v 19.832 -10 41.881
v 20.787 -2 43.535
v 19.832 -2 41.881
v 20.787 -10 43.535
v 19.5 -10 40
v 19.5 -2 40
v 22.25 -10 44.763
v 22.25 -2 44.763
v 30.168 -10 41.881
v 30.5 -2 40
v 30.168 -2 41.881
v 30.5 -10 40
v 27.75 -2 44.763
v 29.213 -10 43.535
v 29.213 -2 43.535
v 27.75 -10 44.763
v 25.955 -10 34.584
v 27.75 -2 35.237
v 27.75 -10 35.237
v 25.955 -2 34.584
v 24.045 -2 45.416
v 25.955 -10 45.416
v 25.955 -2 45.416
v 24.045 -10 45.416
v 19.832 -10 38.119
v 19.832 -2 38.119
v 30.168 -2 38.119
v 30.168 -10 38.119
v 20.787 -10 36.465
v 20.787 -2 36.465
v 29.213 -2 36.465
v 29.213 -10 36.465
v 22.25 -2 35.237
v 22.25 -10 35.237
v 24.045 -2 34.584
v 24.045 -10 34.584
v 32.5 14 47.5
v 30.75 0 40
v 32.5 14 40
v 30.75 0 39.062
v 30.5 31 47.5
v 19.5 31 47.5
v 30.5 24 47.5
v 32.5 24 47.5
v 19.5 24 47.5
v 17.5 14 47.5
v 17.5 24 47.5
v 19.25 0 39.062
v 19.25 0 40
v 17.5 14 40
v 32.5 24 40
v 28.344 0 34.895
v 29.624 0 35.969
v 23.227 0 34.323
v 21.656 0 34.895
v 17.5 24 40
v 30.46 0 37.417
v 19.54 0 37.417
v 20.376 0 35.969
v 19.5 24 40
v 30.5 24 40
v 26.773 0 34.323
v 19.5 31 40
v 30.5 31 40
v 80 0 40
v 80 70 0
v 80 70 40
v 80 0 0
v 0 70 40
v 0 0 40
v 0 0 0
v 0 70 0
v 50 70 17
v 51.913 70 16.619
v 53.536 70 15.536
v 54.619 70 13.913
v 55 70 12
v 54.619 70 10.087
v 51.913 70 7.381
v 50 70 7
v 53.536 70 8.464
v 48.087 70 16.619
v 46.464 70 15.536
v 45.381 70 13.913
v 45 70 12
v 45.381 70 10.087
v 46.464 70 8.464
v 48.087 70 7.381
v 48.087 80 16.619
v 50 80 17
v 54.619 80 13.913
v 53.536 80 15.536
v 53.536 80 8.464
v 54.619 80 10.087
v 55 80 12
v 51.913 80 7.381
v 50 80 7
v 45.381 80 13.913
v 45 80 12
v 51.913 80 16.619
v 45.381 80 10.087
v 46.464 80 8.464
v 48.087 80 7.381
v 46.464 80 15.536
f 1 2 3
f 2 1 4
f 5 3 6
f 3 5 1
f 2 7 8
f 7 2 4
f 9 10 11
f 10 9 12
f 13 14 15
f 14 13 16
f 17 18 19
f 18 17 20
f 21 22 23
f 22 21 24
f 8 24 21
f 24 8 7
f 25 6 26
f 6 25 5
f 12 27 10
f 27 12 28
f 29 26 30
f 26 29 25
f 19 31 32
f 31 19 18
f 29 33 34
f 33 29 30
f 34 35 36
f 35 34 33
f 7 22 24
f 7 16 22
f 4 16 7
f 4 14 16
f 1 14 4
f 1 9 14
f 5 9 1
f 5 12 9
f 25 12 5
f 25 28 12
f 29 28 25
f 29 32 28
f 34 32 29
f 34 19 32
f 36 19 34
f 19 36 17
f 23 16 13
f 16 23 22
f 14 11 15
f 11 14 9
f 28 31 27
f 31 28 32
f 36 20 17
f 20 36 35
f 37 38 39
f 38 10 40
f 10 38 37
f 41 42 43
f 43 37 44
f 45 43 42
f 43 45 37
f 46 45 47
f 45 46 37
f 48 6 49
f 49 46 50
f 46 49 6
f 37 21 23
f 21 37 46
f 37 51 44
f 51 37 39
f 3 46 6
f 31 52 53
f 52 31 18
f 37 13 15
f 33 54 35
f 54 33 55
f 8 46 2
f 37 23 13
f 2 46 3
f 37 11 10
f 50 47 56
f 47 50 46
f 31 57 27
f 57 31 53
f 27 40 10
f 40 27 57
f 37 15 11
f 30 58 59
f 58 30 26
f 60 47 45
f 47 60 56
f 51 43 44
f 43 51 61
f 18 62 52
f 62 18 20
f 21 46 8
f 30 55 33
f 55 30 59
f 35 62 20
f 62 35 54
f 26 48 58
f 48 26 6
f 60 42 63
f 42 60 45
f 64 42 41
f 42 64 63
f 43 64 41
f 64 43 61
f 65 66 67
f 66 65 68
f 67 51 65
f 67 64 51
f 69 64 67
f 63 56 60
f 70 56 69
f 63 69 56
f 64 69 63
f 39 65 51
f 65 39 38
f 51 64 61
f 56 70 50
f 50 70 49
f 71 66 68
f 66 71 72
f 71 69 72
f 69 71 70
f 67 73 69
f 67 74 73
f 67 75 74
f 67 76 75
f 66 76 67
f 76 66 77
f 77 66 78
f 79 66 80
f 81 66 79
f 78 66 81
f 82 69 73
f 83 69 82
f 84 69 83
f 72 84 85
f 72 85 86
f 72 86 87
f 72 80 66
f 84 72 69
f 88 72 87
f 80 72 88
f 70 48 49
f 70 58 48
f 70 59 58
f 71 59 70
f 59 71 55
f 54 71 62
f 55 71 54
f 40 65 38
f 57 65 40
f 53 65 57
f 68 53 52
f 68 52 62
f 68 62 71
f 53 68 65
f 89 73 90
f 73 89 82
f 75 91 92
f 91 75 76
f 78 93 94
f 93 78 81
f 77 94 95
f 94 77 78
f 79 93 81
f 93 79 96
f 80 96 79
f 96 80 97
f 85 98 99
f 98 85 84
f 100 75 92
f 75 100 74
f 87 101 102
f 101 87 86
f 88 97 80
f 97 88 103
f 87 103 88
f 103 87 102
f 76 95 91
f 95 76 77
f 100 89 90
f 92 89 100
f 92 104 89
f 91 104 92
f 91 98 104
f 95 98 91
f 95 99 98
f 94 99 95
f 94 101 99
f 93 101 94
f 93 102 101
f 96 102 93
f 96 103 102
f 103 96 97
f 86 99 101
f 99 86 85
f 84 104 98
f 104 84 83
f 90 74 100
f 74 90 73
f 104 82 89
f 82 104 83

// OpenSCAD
module inner() {
  height = 40;
  depth = 70;
  width = 80;
  audiojack_r = 10/2;
  port_depth= 10;
  audiojack_x=25;
  audiojack_y=7;
  cube([width,depth,height]);
  // audio jack
  translate([width-audiojack_r-audiojack_x,depth,audiojack_r+audiojack_y])
  rotate([-90,0,0]) {
    cylinder(port_depth,audiojack_r, audiojack_r, center=false);
  }
  //power jack
  translate([audiojack_x,-port_depth,height])
  rotate([-90,180,0])
  dc_jack();
}

module dc_jack() {
  rubber_r = 11/2;
  rubber_r_depth = 8;
  rubber_depth = 30;
  rubber_back = 15;
  rubber_back_depth = 10;
  terminal_depth = 7;
  terminal_width = 11;
  //female side
  cylinder(rubber_r_depth, rubber_r, rubber_r);

  hull() {
  translate([0,0,rubber_r_depth])
  cylinder(rubber_r_depth, rubber_r, rubber_r);

  translate([-rubber_back/2, -rubber_back/2,rubber_r_depth*3])
  cube([rubber_back, rubber_back, rubber_back_depth]);
  }
  //terminals
  translate([-terminal_width/2, (rubber_back-terminal_width*2)/2,rubber_r_depth*3+rubber_back_depth])
    cube([terminal_width, terminal_width, terminal_depth]);

}

//dc_jack();
inner();
